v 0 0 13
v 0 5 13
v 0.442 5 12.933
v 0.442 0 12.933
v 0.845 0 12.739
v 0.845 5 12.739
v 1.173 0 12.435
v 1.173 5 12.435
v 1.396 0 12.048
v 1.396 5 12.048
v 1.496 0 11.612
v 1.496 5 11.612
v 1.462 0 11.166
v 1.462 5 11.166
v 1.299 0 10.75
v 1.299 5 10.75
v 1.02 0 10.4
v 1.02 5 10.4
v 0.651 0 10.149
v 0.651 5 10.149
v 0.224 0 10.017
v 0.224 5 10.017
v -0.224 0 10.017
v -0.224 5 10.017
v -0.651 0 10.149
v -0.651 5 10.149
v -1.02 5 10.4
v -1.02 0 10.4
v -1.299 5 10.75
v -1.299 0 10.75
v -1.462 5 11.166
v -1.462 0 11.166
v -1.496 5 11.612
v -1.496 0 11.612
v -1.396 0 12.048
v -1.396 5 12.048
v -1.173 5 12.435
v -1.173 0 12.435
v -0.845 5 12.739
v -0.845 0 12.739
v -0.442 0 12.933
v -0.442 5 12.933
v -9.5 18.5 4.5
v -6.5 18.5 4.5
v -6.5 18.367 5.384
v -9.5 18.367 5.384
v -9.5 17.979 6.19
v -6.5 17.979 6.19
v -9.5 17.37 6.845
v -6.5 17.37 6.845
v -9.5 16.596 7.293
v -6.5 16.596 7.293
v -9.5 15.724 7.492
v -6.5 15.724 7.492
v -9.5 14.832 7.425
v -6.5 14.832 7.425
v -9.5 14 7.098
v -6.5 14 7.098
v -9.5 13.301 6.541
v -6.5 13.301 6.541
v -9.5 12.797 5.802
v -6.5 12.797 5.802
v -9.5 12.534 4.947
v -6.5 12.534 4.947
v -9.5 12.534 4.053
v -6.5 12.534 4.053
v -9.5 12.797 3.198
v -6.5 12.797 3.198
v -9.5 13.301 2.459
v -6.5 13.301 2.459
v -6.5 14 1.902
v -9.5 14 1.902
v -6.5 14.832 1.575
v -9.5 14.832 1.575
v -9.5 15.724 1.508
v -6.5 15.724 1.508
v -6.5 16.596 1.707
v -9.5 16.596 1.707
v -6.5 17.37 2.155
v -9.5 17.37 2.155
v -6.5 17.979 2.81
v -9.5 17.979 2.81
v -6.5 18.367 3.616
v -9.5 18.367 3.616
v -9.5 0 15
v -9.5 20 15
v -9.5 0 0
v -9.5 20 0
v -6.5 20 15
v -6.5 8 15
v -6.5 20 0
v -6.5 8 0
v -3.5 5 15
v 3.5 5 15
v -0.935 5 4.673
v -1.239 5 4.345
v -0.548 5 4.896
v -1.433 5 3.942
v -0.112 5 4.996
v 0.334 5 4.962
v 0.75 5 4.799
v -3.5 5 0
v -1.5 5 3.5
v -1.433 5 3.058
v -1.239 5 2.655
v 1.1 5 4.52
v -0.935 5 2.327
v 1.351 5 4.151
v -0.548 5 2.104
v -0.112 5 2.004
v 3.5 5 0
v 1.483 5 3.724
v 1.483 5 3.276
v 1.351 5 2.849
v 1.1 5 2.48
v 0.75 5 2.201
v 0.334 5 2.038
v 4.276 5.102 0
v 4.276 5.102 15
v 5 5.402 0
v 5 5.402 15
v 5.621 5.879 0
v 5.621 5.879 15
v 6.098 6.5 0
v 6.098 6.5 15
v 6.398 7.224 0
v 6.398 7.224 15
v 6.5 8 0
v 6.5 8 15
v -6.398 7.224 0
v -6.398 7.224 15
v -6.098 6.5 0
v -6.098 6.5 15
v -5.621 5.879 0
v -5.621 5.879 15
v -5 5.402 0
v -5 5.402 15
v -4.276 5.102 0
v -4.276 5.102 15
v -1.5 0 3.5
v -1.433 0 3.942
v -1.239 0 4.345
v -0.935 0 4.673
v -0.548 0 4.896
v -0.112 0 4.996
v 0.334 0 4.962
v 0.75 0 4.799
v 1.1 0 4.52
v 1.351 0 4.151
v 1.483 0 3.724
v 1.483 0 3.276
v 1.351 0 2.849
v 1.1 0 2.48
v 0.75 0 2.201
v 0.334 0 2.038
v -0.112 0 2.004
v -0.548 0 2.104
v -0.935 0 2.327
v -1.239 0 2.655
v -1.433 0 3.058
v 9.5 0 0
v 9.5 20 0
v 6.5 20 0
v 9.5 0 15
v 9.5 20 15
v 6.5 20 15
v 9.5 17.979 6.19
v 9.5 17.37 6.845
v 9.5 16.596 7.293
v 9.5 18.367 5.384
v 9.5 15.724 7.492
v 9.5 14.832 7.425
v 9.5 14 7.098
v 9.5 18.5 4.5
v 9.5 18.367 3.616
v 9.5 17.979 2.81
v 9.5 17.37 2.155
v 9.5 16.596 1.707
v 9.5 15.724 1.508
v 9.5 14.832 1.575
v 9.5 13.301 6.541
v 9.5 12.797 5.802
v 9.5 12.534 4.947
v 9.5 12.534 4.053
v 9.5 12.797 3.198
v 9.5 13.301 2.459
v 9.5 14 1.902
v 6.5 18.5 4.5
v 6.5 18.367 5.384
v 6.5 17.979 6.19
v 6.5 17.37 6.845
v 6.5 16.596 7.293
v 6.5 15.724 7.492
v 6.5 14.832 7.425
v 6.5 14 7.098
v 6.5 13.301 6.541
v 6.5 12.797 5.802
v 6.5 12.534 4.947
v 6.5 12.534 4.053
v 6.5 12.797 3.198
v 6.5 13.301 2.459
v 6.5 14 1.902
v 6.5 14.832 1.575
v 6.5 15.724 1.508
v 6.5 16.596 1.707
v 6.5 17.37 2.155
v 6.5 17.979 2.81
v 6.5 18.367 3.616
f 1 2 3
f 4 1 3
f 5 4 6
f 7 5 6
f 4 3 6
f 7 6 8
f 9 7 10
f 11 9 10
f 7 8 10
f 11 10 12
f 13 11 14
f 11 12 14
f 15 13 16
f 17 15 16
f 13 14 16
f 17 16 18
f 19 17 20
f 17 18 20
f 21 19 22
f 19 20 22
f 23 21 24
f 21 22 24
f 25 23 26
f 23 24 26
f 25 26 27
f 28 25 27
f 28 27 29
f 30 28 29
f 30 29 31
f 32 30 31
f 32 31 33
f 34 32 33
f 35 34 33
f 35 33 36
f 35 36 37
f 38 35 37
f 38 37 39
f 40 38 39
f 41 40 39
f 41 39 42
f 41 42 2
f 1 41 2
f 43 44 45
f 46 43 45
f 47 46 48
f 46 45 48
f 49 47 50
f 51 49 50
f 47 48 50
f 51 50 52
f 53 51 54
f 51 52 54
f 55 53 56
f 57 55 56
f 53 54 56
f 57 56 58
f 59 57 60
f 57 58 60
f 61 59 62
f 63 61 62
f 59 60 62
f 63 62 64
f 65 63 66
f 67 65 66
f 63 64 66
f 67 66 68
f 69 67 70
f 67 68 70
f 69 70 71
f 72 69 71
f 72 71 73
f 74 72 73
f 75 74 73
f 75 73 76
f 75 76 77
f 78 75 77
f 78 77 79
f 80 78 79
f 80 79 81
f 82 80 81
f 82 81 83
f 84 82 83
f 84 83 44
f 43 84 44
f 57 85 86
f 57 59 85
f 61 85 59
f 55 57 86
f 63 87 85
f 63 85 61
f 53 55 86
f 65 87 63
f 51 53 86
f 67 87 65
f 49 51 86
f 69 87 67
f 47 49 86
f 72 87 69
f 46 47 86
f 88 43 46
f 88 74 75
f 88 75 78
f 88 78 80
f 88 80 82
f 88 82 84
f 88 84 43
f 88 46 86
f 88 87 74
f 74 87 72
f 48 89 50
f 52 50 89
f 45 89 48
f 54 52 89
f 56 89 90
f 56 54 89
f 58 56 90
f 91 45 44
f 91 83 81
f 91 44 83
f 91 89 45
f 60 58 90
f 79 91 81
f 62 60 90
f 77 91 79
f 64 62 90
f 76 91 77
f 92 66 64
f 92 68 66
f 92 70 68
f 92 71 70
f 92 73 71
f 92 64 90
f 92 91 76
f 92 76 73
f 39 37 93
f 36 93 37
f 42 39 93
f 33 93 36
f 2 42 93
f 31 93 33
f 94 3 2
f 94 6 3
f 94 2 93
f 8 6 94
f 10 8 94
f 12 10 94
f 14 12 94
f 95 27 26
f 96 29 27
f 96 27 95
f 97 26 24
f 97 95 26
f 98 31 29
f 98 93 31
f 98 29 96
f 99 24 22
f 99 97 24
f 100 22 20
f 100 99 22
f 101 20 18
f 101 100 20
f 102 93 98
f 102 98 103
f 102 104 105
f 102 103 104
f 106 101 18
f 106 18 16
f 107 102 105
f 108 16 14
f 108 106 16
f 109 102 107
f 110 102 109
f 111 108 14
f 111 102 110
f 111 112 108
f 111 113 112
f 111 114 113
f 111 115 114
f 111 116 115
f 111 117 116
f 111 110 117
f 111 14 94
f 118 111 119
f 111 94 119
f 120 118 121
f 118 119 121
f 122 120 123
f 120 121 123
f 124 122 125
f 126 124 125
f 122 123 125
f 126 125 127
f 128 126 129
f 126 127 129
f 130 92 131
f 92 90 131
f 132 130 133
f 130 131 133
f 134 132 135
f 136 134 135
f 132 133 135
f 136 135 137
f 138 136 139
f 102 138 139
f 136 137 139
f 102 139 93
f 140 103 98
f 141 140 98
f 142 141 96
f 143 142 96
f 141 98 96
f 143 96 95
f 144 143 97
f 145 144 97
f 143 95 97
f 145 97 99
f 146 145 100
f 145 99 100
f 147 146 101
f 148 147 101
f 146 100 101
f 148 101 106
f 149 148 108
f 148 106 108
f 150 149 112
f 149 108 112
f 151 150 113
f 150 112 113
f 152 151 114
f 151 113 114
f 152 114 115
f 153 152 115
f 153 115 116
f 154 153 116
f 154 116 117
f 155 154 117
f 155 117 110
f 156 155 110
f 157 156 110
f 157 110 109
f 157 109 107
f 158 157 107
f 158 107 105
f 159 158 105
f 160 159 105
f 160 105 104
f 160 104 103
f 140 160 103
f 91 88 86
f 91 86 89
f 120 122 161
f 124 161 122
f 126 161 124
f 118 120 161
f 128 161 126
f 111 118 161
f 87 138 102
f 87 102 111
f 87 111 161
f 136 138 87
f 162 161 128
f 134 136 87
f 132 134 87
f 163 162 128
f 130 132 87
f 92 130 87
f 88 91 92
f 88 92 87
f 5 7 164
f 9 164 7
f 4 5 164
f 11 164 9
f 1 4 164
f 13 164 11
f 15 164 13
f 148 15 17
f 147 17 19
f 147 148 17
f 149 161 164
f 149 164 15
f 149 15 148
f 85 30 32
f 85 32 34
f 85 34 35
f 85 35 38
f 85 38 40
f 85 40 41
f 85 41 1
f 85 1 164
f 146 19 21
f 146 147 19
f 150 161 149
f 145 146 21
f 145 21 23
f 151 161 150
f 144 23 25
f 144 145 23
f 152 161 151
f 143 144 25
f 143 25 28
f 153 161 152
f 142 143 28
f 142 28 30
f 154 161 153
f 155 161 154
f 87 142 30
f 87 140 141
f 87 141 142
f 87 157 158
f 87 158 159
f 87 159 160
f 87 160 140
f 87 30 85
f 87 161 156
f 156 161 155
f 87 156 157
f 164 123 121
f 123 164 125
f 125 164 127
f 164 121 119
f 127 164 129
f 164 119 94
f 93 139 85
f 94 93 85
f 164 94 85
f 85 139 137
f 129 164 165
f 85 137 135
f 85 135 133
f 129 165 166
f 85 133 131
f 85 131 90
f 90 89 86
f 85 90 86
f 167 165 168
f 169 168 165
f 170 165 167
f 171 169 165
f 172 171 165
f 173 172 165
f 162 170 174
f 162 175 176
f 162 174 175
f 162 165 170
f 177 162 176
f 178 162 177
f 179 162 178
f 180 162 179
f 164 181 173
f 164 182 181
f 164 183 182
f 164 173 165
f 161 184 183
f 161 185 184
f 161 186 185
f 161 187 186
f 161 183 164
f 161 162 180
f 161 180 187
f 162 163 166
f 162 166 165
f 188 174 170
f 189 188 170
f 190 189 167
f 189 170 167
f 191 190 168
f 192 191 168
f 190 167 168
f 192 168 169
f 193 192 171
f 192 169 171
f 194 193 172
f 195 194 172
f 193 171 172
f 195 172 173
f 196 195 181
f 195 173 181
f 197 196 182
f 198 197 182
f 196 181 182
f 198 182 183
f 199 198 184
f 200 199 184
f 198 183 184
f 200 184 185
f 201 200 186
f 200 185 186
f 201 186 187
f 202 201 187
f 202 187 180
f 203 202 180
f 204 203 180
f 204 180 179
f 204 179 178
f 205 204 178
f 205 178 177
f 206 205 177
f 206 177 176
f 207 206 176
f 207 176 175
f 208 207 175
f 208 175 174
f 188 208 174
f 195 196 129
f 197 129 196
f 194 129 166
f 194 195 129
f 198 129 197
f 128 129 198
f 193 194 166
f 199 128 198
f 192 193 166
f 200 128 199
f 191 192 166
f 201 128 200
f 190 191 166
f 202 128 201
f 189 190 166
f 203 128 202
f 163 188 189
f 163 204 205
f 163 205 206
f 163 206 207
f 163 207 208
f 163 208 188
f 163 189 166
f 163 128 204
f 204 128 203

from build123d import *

# Parameters (mm, degrees)
EXTRUDE_1_DEPTH     = 15
FILLET_1_R          = 3
SKETCH_2_R          = 3
CUT_EXTRUDE_1_DEPTH = 32.400636936
SKETCH_3_R          = 1.5
CUT_EXTRUDE_2_DEPTH = 10
SKETCH_3_3_R        = 1.5
CUT_EXTRUDE_3_DEPTH = 10


with BuildPart() as part:
    # 草图1 → 凸台-拉伸1 (new body)
    with BuildSketch(Plane.XY):
        Polygon((9.5, 0), (-9.5, 0), (-9.5, 20), (-6.5, 20), (-6.5, 5), (6.5, 5), (6.5, 20), (9.5, 20), align=None)
    extrude(amount=EXTRUDE_1_DEPTH)

    # 圆角1
    fillet_1_edges = [part.edges().sort_by_distance(p)[0] for p in [
        (-6.5, 5, 7.5),
        (6.5, 5, 7.5),
    ]]
    fillet(fillet_1_edges, radius=FILLET_1_R)

    # 草图2 → 切除-拉伸1 (cut, through all)
    with BuildSketch(Plane(origin=(9.5, 0, 0), x_dir=(0, 0, -1), z_dir=(1, 0, 0))):
        with Locations((-4.5, 15.5)):
            Circle(SKETCH_2_R)
    extrude(amount=-CUT_EXTRUDE_1_DEPTH, mode=Mode.SUBTRACT)

    # 草图3 → 切除-拉伸2 (cut)
    with BuildSketch(Plane(origin=(0, 5, 0), x_dir=(1, 0, 0), z_dir=(0, 1, 0))):
        with Locations((0, -11.5)):
            Circle(SKETCH_3_R)
    extrude(amount=-CUT_EXTRUDE_2_DEPTH, mode=Mode.SUBTRACT)

    # 草图3<3> → 切除-拉伸3 (cut)
    with BuildSketch(Plane(origin=(0, 5, 0), x_dir=(1, 0, 0), z_dir=(0, 1, 0))):
        with Locations((0, -11.5)):
            Circle(SKETCH_3_3_R)
        with Locations((0, -3.5)):
            Circle(SKETCH_3_3_R)
    extrude(amount=-CUT_EXTRUDE_3_DEPTH, mode=Mode.SUBTRACT)


solid = part.part
